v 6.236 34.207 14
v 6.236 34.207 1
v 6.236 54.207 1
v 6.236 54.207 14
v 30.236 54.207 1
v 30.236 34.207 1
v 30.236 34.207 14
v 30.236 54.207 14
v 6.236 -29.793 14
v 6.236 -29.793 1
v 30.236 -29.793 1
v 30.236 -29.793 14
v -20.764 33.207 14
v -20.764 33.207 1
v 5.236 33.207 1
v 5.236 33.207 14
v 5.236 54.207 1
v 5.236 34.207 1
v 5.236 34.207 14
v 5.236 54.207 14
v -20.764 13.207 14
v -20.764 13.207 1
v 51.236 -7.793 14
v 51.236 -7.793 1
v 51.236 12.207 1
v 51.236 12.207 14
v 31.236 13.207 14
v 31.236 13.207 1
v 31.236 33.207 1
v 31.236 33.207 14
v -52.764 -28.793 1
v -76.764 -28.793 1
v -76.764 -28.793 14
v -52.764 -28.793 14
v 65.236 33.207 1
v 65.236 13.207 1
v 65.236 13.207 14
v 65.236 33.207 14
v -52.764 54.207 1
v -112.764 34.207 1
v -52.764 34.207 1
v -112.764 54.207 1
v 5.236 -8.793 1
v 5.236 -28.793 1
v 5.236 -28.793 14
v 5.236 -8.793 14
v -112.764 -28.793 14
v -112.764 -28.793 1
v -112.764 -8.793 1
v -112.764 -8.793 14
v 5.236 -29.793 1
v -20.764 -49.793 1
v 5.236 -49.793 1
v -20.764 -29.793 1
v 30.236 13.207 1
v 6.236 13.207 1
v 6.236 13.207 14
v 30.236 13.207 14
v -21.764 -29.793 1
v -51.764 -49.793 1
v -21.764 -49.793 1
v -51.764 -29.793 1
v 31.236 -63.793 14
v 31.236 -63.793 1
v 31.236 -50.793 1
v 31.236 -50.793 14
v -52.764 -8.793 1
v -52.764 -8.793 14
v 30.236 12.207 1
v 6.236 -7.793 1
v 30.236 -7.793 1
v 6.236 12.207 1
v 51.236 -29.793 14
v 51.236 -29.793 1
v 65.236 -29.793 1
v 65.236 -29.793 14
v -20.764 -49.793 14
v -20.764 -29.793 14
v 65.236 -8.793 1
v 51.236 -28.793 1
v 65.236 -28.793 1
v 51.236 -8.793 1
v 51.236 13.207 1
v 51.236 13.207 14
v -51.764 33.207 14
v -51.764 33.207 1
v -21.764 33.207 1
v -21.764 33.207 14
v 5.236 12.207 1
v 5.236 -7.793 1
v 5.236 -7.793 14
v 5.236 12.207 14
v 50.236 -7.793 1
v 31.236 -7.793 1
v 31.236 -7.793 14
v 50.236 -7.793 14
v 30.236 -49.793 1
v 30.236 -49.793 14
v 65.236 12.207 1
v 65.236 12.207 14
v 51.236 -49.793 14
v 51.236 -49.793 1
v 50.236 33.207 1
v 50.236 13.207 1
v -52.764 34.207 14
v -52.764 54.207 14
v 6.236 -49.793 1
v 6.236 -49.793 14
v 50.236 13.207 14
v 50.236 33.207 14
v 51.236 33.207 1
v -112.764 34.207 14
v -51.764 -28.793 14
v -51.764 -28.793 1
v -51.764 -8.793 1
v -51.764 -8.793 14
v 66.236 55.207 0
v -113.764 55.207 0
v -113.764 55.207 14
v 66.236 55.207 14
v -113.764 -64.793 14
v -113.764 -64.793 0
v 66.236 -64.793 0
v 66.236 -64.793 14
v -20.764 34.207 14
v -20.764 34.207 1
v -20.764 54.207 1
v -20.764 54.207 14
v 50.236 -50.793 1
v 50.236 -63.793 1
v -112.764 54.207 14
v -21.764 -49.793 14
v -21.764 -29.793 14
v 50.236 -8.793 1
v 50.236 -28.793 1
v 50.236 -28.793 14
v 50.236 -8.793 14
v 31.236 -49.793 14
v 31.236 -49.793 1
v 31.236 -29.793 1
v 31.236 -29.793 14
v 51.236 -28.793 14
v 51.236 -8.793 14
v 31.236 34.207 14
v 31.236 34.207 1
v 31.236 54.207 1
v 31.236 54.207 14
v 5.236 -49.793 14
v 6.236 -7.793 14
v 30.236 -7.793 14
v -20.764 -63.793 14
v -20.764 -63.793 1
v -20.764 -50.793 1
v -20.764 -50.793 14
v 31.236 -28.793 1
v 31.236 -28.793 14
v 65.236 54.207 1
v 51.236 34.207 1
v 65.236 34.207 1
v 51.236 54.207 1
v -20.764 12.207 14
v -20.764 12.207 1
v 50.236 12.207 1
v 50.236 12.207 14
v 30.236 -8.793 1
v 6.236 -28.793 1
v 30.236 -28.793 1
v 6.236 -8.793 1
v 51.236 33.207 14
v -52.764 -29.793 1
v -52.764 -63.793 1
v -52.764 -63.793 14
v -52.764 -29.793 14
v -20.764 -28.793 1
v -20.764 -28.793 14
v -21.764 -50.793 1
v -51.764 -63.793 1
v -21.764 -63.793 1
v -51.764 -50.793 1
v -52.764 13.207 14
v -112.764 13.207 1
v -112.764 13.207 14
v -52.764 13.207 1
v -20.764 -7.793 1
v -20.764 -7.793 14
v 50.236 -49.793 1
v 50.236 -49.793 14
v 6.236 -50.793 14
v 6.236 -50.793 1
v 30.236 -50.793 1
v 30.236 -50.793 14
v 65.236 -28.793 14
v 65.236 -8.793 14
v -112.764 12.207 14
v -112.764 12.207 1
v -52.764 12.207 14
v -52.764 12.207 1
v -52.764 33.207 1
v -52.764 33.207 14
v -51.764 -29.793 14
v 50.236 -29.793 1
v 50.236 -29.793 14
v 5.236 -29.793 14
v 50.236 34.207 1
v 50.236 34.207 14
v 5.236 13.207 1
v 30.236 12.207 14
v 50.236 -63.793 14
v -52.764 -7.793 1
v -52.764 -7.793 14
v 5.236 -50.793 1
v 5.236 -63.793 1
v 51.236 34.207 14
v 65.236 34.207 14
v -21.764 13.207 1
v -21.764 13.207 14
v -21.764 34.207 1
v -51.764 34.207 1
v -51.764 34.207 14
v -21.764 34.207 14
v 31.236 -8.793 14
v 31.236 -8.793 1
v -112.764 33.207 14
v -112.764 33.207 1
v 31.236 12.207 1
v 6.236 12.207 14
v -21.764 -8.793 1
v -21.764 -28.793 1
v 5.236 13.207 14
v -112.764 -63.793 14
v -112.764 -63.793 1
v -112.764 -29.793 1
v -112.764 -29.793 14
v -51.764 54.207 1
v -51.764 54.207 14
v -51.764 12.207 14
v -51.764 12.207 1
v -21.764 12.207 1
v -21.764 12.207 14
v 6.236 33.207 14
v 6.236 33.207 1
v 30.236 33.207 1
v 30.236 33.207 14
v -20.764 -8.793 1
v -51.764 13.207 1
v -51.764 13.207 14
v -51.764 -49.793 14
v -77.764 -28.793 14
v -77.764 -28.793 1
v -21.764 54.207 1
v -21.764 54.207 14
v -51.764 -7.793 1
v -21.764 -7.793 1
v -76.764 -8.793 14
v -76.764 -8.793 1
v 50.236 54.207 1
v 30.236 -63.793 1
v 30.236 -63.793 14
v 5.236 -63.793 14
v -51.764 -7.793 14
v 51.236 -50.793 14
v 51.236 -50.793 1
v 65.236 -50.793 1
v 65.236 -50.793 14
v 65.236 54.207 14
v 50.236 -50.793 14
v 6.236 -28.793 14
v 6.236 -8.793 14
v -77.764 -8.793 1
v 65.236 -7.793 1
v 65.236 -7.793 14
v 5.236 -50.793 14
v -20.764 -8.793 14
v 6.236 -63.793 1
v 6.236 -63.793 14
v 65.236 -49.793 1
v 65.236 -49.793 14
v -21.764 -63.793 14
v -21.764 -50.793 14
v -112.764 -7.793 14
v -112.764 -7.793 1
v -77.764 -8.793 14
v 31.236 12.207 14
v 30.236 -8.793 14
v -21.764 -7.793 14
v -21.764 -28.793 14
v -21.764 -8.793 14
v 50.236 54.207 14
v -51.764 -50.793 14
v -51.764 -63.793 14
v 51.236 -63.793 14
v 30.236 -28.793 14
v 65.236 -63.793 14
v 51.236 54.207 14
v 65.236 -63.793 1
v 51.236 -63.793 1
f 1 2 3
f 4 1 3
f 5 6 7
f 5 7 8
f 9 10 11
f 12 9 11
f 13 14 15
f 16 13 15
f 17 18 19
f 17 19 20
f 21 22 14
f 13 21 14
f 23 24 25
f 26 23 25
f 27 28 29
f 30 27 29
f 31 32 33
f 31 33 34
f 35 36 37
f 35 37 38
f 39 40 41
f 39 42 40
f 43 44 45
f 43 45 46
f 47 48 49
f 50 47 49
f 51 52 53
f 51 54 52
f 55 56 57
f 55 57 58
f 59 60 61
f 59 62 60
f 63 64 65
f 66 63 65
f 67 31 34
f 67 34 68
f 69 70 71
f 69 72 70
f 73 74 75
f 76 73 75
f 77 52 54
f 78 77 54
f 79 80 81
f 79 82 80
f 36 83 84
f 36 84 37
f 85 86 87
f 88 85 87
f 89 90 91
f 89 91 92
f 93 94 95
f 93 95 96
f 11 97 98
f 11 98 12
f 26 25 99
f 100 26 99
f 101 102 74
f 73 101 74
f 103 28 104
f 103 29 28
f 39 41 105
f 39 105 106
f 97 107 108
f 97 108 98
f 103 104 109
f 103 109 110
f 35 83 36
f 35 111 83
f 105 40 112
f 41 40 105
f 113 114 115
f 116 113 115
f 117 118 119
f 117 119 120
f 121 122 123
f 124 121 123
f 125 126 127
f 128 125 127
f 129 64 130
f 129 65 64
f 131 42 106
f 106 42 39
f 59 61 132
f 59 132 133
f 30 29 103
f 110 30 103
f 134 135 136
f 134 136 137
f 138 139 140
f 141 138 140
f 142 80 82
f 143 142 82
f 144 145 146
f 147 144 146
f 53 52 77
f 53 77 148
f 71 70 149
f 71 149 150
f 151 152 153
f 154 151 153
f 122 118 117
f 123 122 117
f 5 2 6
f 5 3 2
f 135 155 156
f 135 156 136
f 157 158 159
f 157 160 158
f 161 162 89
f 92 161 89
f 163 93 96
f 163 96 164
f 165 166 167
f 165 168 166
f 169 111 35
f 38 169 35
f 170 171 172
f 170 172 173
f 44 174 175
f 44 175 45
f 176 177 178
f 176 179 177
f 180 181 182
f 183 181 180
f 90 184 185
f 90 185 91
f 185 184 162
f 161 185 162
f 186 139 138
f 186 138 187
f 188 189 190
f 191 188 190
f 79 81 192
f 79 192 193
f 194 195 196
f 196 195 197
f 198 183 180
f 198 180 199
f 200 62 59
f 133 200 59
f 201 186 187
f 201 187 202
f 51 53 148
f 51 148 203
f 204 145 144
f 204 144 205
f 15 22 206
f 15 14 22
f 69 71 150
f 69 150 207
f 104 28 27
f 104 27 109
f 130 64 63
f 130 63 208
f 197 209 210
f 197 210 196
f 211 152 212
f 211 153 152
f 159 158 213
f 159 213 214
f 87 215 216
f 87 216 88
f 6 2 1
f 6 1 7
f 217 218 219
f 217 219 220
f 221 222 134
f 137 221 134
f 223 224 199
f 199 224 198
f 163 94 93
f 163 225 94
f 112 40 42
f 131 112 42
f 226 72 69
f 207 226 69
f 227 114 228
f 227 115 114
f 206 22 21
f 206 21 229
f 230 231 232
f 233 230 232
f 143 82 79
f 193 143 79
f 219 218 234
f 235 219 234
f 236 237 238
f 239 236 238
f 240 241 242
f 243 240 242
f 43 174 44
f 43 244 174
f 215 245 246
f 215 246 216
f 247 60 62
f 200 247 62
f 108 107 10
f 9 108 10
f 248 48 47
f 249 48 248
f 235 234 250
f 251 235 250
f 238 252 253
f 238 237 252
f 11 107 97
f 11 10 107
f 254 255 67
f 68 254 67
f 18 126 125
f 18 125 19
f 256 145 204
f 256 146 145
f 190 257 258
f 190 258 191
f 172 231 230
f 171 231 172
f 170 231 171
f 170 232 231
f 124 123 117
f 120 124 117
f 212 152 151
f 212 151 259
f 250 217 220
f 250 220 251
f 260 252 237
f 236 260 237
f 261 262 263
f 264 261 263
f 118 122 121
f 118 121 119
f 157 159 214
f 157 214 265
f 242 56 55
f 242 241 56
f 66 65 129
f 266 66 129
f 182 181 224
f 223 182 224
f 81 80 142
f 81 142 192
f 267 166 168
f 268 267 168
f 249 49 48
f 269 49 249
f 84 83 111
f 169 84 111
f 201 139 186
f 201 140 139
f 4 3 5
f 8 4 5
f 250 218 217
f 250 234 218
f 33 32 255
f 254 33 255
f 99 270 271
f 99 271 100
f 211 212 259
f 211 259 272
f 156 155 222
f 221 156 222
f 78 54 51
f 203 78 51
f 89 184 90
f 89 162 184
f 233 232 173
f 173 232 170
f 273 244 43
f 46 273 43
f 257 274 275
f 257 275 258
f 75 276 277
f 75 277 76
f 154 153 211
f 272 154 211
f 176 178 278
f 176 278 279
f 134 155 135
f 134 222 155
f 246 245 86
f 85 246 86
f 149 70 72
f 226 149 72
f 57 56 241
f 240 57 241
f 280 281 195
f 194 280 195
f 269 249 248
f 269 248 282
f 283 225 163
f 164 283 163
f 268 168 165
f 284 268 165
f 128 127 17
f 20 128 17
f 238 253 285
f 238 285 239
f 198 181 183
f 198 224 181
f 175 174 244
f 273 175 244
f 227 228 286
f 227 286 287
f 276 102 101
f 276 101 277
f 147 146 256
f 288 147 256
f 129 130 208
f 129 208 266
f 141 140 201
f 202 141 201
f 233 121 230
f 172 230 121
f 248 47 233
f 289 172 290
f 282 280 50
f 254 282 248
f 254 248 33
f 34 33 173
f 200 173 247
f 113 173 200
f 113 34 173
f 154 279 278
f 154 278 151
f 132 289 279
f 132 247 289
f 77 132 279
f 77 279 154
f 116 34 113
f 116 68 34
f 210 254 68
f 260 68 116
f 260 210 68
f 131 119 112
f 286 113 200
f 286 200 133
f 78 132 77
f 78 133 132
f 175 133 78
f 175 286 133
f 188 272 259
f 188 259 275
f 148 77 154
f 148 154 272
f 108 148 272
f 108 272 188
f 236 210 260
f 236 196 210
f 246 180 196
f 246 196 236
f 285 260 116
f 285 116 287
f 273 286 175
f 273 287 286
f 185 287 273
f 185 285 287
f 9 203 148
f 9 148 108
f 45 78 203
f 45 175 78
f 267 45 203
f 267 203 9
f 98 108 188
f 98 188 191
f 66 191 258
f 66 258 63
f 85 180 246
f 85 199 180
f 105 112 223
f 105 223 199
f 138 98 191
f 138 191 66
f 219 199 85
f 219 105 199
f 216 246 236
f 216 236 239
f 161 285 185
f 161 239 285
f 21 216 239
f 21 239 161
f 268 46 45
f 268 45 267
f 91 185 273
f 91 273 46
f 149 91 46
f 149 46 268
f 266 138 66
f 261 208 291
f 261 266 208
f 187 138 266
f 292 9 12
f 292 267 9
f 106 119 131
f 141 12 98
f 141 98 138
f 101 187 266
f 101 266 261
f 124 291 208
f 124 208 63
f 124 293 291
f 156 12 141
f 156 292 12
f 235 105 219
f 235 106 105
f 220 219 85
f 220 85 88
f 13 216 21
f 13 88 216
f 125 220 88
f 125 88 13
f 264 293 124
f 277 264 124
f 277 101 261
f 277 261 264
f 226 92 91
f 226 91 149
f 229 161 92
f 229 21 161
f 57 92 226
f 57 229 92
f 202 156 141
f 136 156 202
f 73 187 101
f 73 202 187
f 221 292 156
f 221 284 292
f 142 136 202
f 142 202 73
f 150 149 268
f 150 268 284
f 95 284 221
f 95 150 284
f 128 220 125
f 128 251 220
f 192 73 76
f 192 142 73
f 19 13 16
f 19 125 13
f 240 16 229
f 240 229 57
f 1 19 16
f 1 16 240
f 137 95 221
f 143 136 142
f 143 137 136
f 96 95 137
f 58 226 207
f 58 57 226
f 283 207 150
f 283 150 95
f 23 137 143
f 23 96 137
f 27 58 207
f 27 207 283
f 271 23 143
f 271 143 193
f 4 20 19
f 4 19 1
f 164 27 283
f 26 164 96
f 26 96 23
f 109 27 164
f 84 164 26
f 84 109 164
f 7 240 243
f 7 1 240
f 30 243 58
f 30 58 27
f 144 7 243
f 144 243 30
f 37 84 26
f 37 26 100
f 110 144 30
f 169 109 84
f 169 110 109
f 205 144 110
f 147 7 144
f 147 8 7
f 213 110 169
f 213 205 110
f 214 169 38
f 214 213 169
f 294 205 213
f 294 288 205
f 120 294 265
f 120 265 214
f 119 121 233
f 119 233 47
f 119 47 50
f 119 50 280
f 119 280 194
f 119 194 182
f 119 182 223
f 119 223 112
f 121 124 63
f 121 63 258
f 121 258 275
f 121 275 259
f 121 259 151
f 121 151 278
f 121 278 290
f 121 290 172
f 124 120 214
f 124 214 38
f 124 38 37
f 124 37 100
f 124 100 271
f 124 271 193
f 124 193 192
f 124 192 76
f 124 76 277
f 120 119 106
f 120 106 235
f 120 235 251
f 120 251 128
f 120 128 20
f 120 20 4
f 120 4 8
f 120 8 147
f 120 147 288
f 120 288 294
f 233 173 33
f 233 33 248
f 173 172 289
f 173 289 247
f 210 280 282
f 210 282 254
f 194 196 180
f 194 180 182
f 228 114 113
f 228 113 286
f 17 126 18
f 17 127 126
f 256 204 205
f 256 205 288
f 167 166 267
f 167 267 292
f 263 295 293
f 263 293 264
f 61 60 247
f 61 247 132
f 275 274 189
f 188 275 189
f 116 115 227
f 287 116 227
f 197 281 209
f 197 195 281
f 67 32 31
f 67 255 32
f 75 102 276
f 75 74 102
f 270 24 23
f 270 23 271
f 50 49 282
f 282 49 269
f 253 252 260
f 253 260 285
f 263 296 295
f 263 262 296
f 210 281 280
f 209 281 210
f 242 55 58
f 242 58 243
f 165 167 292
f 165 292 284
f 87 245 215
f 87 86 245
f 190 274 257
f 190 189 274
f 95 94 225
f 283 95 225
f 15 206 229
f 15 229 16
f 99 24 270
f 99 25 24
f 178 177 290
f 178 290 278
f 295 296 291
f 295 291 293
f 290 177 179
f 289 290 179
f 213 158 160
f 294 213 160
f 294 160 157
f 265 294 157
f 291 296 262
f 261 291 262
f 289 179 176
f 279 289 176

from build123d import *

# Parameters (mm, degrees)
F0_W     = 180
F0_H     = 120
F1_DEPTH = 1
F2_W     = 180
F2_H     = 120
F2_W_2   = 60
F2_H_2   = 34
F2_W_3   = 30
F2_H_3   = 13
F2_H_4   = 20
F2_W_4   = 35
F2_W_5   = 24
F2_W_6   = 26
F2_W_7   = 19
F2_W_8   = 14
F3_DEPTH = 14


with BuildPart() as f1:
    # F0 (on Top) → F1 (new body)
    with BuildSketch(Plane.XY):
        with Locations((-23.763961, -4.79302)):
            Rectangle(F0_W, F0_H)
    extrude(amount=F1_DEPTH)

    # F2 (on Top) → F3 (join)
    with BuildSketch(Plane.XY):
        with Locations((-23.763961, -4.79302)):
            Rectangle(F2_W, F2_H)
        with Locations((-82.763961, -46.79302)):
            Rectangle(F2_W_2, F2_H_2, mode=Mode.SUBTRACT)
        with Locations((-36.763961, -57.29302)):
            Rectangle(F2_W_3, F2_H_3, mode=Mode.SUBTRACT)
        with Locations((-36.763961, -39.79302)):
            Rectangle(F2_W_3, F2_H_4, mode=Mode.SUBTRACT)
        with Locations((-95.263961, -18.79302)):
            Rectangle(F2_W_4, F2_H_4, mode=Mode.SUBTRACT)
        with Locations((-64.763961, -18.79302)):
            Rectangle(F2_W_5, F2_H_4, mode=Mode.SUBTRACT)
        with Locations((-36.763961, -18.79302)):
            Rectangle(F2_W_3, F2_H_4, mode=Mode.SUBTRACT)
        with Locations((-7.763961, -57.29302)):
            Rectangle(F2_W_6, F2_H_3, mode=Mode.SUBTRACT)
        with Locations((18.236039, -57.29302)):
            Rectangle(F2_W_5, F2_H_3, mode=Mode.SUBTRACT)
        with Locations((-7.763961, -39.79302)):
            Rectangle(F2_W_6, F2_H_4, mode=Mode.SUBTRACT)
        with Locations((18.236039, -39.79302)):
            Rectangle(F2_W_5, F2_H_4, mode=Mode.SUBTRACT)
        with Locations((40.736039, -57.29302)):
            Rectangle(F2_W_7, F2_H_3, mode=Mode.SUBTRACT)
        with Locations((58.236039, -57.29302)):
            Rectangle(F2_W_8, F2_H_3, mode=Mode.SUBTRACT)
        with Locations((40.736039, -39.79302)):
            Rectangle(F2_W_7, F2_H_4, mode=Mode.SUBTRACT)
        with Locations((58.236039, -39.79302)):
            Rectangle(F2_W_8, F2_H_4, mode=Mode.SUBTRACT)
        with Locations((-7.763961, -18.79302)):
            Rectangle(F2_W_6, F2_H_4, mode=Mode.SUBTRACT)
        with Locations((18.236039, -18.79302)):
            Rectangle(F2_W_5, F2_H_4, mode=Mode.SUBTRACT)
        with Locations((40.736039, -18.79302)):
            Rectangle(F2_W_7, F2_H_4, mode=Mode.SUBTRACT)
        with Locations((58.236039, -18.79302)):
            Rectangle(F2_W_8, F2_H_4, mode=Mode.SUBTRACT)
        with Locations((-82.763961, 2.20698)):
            Rectangle(F2_W_2, F2_H_4, mode=Mode.SUBTRACT)
        with Locations((-82.763961, 23.20698)):
            Rectangle(F2_W_2, F2_H_4, mode=Mode.SUBTRACT)
        with Locations((-36.763961, 2.20698)):
            Rectangle(F2_W_3, F2_H_4, mode=Mode.SUBTRACT)
        with Locations((-36.763961, 23.20698)):
            Rectangle(F2_W_3, F2_H_4, mode=Mode.SUBTRACT)
        with Locations((-82.763961, 44.20698)):
            Rectangle(F2_W_2, F2_H_4, mode=Mode.SUBTRACT)
        with Locations((-36.763961, 44.20698)):
            Rectangle(F2_W_3, F2_H_4, mode=Mode.SUBTRACT)
        with Locations((-7.763961, 2.20698)):
            Rectangle(F2_W_6, F2_H_4, mode=Mode.SUBTRACT)
        with Locations((18.236039, 2.20698)):
            Rectangle(F2_W_5, F2_H_4, mode=Mode.SUBTRACT)
        with Locations((-7.763961, 23.20698)):
            Rectangle(F2_W_6, F2_H_4, mode=Mode.SUBTRACT)
        with Locations((18.236039, 23.20698)):
            Rectangle(F2_W_5, F2_H_4, mode=Mode.SUBTRACT)
        with Locations((40.736039, 2.20698)):
            Rectangle(F2_W_7, F2_H_4, mode=Mode.SUBTRACT)
        with Locations((58.236039, 2.20698)):
            Rectangle(F2_W_8, F2_H_4, mode=Mode.SUBTRACT)
        with Locations((40.736039, 23.20698)):
            Rectangle(F2_W_7, F2_H_4, mode=Mode.SUBTRACT)
        with Locations((58.236039, 23.20698)):
            Rectangle(F2_W_8, F2_H_4, mode=Mode.SUBTRACT)
        with Locations((-7.763961, 44.20698)):
            Rectangle(F2_W_6, F2_H_4, mode=Mode.SUBTRACT)
        with Locations((18.236039, 44.20698)):
            Rectangle(F2_W_5, F2_H_4, mode=Mode.SUBTRACT)
        with Locations((40.736039, 44.20698)):
            Rectangle(F2_W_7, F2_H_4, mode=Mode.SUBTRACT)
        with Locations((58.236039, 44.20698)):
            Rectangle(F2_W_8, F2_H_4, mode=Mode.SUBTRACT)
    extrude(amount=F3_DEPTH)


solid = f1.part
